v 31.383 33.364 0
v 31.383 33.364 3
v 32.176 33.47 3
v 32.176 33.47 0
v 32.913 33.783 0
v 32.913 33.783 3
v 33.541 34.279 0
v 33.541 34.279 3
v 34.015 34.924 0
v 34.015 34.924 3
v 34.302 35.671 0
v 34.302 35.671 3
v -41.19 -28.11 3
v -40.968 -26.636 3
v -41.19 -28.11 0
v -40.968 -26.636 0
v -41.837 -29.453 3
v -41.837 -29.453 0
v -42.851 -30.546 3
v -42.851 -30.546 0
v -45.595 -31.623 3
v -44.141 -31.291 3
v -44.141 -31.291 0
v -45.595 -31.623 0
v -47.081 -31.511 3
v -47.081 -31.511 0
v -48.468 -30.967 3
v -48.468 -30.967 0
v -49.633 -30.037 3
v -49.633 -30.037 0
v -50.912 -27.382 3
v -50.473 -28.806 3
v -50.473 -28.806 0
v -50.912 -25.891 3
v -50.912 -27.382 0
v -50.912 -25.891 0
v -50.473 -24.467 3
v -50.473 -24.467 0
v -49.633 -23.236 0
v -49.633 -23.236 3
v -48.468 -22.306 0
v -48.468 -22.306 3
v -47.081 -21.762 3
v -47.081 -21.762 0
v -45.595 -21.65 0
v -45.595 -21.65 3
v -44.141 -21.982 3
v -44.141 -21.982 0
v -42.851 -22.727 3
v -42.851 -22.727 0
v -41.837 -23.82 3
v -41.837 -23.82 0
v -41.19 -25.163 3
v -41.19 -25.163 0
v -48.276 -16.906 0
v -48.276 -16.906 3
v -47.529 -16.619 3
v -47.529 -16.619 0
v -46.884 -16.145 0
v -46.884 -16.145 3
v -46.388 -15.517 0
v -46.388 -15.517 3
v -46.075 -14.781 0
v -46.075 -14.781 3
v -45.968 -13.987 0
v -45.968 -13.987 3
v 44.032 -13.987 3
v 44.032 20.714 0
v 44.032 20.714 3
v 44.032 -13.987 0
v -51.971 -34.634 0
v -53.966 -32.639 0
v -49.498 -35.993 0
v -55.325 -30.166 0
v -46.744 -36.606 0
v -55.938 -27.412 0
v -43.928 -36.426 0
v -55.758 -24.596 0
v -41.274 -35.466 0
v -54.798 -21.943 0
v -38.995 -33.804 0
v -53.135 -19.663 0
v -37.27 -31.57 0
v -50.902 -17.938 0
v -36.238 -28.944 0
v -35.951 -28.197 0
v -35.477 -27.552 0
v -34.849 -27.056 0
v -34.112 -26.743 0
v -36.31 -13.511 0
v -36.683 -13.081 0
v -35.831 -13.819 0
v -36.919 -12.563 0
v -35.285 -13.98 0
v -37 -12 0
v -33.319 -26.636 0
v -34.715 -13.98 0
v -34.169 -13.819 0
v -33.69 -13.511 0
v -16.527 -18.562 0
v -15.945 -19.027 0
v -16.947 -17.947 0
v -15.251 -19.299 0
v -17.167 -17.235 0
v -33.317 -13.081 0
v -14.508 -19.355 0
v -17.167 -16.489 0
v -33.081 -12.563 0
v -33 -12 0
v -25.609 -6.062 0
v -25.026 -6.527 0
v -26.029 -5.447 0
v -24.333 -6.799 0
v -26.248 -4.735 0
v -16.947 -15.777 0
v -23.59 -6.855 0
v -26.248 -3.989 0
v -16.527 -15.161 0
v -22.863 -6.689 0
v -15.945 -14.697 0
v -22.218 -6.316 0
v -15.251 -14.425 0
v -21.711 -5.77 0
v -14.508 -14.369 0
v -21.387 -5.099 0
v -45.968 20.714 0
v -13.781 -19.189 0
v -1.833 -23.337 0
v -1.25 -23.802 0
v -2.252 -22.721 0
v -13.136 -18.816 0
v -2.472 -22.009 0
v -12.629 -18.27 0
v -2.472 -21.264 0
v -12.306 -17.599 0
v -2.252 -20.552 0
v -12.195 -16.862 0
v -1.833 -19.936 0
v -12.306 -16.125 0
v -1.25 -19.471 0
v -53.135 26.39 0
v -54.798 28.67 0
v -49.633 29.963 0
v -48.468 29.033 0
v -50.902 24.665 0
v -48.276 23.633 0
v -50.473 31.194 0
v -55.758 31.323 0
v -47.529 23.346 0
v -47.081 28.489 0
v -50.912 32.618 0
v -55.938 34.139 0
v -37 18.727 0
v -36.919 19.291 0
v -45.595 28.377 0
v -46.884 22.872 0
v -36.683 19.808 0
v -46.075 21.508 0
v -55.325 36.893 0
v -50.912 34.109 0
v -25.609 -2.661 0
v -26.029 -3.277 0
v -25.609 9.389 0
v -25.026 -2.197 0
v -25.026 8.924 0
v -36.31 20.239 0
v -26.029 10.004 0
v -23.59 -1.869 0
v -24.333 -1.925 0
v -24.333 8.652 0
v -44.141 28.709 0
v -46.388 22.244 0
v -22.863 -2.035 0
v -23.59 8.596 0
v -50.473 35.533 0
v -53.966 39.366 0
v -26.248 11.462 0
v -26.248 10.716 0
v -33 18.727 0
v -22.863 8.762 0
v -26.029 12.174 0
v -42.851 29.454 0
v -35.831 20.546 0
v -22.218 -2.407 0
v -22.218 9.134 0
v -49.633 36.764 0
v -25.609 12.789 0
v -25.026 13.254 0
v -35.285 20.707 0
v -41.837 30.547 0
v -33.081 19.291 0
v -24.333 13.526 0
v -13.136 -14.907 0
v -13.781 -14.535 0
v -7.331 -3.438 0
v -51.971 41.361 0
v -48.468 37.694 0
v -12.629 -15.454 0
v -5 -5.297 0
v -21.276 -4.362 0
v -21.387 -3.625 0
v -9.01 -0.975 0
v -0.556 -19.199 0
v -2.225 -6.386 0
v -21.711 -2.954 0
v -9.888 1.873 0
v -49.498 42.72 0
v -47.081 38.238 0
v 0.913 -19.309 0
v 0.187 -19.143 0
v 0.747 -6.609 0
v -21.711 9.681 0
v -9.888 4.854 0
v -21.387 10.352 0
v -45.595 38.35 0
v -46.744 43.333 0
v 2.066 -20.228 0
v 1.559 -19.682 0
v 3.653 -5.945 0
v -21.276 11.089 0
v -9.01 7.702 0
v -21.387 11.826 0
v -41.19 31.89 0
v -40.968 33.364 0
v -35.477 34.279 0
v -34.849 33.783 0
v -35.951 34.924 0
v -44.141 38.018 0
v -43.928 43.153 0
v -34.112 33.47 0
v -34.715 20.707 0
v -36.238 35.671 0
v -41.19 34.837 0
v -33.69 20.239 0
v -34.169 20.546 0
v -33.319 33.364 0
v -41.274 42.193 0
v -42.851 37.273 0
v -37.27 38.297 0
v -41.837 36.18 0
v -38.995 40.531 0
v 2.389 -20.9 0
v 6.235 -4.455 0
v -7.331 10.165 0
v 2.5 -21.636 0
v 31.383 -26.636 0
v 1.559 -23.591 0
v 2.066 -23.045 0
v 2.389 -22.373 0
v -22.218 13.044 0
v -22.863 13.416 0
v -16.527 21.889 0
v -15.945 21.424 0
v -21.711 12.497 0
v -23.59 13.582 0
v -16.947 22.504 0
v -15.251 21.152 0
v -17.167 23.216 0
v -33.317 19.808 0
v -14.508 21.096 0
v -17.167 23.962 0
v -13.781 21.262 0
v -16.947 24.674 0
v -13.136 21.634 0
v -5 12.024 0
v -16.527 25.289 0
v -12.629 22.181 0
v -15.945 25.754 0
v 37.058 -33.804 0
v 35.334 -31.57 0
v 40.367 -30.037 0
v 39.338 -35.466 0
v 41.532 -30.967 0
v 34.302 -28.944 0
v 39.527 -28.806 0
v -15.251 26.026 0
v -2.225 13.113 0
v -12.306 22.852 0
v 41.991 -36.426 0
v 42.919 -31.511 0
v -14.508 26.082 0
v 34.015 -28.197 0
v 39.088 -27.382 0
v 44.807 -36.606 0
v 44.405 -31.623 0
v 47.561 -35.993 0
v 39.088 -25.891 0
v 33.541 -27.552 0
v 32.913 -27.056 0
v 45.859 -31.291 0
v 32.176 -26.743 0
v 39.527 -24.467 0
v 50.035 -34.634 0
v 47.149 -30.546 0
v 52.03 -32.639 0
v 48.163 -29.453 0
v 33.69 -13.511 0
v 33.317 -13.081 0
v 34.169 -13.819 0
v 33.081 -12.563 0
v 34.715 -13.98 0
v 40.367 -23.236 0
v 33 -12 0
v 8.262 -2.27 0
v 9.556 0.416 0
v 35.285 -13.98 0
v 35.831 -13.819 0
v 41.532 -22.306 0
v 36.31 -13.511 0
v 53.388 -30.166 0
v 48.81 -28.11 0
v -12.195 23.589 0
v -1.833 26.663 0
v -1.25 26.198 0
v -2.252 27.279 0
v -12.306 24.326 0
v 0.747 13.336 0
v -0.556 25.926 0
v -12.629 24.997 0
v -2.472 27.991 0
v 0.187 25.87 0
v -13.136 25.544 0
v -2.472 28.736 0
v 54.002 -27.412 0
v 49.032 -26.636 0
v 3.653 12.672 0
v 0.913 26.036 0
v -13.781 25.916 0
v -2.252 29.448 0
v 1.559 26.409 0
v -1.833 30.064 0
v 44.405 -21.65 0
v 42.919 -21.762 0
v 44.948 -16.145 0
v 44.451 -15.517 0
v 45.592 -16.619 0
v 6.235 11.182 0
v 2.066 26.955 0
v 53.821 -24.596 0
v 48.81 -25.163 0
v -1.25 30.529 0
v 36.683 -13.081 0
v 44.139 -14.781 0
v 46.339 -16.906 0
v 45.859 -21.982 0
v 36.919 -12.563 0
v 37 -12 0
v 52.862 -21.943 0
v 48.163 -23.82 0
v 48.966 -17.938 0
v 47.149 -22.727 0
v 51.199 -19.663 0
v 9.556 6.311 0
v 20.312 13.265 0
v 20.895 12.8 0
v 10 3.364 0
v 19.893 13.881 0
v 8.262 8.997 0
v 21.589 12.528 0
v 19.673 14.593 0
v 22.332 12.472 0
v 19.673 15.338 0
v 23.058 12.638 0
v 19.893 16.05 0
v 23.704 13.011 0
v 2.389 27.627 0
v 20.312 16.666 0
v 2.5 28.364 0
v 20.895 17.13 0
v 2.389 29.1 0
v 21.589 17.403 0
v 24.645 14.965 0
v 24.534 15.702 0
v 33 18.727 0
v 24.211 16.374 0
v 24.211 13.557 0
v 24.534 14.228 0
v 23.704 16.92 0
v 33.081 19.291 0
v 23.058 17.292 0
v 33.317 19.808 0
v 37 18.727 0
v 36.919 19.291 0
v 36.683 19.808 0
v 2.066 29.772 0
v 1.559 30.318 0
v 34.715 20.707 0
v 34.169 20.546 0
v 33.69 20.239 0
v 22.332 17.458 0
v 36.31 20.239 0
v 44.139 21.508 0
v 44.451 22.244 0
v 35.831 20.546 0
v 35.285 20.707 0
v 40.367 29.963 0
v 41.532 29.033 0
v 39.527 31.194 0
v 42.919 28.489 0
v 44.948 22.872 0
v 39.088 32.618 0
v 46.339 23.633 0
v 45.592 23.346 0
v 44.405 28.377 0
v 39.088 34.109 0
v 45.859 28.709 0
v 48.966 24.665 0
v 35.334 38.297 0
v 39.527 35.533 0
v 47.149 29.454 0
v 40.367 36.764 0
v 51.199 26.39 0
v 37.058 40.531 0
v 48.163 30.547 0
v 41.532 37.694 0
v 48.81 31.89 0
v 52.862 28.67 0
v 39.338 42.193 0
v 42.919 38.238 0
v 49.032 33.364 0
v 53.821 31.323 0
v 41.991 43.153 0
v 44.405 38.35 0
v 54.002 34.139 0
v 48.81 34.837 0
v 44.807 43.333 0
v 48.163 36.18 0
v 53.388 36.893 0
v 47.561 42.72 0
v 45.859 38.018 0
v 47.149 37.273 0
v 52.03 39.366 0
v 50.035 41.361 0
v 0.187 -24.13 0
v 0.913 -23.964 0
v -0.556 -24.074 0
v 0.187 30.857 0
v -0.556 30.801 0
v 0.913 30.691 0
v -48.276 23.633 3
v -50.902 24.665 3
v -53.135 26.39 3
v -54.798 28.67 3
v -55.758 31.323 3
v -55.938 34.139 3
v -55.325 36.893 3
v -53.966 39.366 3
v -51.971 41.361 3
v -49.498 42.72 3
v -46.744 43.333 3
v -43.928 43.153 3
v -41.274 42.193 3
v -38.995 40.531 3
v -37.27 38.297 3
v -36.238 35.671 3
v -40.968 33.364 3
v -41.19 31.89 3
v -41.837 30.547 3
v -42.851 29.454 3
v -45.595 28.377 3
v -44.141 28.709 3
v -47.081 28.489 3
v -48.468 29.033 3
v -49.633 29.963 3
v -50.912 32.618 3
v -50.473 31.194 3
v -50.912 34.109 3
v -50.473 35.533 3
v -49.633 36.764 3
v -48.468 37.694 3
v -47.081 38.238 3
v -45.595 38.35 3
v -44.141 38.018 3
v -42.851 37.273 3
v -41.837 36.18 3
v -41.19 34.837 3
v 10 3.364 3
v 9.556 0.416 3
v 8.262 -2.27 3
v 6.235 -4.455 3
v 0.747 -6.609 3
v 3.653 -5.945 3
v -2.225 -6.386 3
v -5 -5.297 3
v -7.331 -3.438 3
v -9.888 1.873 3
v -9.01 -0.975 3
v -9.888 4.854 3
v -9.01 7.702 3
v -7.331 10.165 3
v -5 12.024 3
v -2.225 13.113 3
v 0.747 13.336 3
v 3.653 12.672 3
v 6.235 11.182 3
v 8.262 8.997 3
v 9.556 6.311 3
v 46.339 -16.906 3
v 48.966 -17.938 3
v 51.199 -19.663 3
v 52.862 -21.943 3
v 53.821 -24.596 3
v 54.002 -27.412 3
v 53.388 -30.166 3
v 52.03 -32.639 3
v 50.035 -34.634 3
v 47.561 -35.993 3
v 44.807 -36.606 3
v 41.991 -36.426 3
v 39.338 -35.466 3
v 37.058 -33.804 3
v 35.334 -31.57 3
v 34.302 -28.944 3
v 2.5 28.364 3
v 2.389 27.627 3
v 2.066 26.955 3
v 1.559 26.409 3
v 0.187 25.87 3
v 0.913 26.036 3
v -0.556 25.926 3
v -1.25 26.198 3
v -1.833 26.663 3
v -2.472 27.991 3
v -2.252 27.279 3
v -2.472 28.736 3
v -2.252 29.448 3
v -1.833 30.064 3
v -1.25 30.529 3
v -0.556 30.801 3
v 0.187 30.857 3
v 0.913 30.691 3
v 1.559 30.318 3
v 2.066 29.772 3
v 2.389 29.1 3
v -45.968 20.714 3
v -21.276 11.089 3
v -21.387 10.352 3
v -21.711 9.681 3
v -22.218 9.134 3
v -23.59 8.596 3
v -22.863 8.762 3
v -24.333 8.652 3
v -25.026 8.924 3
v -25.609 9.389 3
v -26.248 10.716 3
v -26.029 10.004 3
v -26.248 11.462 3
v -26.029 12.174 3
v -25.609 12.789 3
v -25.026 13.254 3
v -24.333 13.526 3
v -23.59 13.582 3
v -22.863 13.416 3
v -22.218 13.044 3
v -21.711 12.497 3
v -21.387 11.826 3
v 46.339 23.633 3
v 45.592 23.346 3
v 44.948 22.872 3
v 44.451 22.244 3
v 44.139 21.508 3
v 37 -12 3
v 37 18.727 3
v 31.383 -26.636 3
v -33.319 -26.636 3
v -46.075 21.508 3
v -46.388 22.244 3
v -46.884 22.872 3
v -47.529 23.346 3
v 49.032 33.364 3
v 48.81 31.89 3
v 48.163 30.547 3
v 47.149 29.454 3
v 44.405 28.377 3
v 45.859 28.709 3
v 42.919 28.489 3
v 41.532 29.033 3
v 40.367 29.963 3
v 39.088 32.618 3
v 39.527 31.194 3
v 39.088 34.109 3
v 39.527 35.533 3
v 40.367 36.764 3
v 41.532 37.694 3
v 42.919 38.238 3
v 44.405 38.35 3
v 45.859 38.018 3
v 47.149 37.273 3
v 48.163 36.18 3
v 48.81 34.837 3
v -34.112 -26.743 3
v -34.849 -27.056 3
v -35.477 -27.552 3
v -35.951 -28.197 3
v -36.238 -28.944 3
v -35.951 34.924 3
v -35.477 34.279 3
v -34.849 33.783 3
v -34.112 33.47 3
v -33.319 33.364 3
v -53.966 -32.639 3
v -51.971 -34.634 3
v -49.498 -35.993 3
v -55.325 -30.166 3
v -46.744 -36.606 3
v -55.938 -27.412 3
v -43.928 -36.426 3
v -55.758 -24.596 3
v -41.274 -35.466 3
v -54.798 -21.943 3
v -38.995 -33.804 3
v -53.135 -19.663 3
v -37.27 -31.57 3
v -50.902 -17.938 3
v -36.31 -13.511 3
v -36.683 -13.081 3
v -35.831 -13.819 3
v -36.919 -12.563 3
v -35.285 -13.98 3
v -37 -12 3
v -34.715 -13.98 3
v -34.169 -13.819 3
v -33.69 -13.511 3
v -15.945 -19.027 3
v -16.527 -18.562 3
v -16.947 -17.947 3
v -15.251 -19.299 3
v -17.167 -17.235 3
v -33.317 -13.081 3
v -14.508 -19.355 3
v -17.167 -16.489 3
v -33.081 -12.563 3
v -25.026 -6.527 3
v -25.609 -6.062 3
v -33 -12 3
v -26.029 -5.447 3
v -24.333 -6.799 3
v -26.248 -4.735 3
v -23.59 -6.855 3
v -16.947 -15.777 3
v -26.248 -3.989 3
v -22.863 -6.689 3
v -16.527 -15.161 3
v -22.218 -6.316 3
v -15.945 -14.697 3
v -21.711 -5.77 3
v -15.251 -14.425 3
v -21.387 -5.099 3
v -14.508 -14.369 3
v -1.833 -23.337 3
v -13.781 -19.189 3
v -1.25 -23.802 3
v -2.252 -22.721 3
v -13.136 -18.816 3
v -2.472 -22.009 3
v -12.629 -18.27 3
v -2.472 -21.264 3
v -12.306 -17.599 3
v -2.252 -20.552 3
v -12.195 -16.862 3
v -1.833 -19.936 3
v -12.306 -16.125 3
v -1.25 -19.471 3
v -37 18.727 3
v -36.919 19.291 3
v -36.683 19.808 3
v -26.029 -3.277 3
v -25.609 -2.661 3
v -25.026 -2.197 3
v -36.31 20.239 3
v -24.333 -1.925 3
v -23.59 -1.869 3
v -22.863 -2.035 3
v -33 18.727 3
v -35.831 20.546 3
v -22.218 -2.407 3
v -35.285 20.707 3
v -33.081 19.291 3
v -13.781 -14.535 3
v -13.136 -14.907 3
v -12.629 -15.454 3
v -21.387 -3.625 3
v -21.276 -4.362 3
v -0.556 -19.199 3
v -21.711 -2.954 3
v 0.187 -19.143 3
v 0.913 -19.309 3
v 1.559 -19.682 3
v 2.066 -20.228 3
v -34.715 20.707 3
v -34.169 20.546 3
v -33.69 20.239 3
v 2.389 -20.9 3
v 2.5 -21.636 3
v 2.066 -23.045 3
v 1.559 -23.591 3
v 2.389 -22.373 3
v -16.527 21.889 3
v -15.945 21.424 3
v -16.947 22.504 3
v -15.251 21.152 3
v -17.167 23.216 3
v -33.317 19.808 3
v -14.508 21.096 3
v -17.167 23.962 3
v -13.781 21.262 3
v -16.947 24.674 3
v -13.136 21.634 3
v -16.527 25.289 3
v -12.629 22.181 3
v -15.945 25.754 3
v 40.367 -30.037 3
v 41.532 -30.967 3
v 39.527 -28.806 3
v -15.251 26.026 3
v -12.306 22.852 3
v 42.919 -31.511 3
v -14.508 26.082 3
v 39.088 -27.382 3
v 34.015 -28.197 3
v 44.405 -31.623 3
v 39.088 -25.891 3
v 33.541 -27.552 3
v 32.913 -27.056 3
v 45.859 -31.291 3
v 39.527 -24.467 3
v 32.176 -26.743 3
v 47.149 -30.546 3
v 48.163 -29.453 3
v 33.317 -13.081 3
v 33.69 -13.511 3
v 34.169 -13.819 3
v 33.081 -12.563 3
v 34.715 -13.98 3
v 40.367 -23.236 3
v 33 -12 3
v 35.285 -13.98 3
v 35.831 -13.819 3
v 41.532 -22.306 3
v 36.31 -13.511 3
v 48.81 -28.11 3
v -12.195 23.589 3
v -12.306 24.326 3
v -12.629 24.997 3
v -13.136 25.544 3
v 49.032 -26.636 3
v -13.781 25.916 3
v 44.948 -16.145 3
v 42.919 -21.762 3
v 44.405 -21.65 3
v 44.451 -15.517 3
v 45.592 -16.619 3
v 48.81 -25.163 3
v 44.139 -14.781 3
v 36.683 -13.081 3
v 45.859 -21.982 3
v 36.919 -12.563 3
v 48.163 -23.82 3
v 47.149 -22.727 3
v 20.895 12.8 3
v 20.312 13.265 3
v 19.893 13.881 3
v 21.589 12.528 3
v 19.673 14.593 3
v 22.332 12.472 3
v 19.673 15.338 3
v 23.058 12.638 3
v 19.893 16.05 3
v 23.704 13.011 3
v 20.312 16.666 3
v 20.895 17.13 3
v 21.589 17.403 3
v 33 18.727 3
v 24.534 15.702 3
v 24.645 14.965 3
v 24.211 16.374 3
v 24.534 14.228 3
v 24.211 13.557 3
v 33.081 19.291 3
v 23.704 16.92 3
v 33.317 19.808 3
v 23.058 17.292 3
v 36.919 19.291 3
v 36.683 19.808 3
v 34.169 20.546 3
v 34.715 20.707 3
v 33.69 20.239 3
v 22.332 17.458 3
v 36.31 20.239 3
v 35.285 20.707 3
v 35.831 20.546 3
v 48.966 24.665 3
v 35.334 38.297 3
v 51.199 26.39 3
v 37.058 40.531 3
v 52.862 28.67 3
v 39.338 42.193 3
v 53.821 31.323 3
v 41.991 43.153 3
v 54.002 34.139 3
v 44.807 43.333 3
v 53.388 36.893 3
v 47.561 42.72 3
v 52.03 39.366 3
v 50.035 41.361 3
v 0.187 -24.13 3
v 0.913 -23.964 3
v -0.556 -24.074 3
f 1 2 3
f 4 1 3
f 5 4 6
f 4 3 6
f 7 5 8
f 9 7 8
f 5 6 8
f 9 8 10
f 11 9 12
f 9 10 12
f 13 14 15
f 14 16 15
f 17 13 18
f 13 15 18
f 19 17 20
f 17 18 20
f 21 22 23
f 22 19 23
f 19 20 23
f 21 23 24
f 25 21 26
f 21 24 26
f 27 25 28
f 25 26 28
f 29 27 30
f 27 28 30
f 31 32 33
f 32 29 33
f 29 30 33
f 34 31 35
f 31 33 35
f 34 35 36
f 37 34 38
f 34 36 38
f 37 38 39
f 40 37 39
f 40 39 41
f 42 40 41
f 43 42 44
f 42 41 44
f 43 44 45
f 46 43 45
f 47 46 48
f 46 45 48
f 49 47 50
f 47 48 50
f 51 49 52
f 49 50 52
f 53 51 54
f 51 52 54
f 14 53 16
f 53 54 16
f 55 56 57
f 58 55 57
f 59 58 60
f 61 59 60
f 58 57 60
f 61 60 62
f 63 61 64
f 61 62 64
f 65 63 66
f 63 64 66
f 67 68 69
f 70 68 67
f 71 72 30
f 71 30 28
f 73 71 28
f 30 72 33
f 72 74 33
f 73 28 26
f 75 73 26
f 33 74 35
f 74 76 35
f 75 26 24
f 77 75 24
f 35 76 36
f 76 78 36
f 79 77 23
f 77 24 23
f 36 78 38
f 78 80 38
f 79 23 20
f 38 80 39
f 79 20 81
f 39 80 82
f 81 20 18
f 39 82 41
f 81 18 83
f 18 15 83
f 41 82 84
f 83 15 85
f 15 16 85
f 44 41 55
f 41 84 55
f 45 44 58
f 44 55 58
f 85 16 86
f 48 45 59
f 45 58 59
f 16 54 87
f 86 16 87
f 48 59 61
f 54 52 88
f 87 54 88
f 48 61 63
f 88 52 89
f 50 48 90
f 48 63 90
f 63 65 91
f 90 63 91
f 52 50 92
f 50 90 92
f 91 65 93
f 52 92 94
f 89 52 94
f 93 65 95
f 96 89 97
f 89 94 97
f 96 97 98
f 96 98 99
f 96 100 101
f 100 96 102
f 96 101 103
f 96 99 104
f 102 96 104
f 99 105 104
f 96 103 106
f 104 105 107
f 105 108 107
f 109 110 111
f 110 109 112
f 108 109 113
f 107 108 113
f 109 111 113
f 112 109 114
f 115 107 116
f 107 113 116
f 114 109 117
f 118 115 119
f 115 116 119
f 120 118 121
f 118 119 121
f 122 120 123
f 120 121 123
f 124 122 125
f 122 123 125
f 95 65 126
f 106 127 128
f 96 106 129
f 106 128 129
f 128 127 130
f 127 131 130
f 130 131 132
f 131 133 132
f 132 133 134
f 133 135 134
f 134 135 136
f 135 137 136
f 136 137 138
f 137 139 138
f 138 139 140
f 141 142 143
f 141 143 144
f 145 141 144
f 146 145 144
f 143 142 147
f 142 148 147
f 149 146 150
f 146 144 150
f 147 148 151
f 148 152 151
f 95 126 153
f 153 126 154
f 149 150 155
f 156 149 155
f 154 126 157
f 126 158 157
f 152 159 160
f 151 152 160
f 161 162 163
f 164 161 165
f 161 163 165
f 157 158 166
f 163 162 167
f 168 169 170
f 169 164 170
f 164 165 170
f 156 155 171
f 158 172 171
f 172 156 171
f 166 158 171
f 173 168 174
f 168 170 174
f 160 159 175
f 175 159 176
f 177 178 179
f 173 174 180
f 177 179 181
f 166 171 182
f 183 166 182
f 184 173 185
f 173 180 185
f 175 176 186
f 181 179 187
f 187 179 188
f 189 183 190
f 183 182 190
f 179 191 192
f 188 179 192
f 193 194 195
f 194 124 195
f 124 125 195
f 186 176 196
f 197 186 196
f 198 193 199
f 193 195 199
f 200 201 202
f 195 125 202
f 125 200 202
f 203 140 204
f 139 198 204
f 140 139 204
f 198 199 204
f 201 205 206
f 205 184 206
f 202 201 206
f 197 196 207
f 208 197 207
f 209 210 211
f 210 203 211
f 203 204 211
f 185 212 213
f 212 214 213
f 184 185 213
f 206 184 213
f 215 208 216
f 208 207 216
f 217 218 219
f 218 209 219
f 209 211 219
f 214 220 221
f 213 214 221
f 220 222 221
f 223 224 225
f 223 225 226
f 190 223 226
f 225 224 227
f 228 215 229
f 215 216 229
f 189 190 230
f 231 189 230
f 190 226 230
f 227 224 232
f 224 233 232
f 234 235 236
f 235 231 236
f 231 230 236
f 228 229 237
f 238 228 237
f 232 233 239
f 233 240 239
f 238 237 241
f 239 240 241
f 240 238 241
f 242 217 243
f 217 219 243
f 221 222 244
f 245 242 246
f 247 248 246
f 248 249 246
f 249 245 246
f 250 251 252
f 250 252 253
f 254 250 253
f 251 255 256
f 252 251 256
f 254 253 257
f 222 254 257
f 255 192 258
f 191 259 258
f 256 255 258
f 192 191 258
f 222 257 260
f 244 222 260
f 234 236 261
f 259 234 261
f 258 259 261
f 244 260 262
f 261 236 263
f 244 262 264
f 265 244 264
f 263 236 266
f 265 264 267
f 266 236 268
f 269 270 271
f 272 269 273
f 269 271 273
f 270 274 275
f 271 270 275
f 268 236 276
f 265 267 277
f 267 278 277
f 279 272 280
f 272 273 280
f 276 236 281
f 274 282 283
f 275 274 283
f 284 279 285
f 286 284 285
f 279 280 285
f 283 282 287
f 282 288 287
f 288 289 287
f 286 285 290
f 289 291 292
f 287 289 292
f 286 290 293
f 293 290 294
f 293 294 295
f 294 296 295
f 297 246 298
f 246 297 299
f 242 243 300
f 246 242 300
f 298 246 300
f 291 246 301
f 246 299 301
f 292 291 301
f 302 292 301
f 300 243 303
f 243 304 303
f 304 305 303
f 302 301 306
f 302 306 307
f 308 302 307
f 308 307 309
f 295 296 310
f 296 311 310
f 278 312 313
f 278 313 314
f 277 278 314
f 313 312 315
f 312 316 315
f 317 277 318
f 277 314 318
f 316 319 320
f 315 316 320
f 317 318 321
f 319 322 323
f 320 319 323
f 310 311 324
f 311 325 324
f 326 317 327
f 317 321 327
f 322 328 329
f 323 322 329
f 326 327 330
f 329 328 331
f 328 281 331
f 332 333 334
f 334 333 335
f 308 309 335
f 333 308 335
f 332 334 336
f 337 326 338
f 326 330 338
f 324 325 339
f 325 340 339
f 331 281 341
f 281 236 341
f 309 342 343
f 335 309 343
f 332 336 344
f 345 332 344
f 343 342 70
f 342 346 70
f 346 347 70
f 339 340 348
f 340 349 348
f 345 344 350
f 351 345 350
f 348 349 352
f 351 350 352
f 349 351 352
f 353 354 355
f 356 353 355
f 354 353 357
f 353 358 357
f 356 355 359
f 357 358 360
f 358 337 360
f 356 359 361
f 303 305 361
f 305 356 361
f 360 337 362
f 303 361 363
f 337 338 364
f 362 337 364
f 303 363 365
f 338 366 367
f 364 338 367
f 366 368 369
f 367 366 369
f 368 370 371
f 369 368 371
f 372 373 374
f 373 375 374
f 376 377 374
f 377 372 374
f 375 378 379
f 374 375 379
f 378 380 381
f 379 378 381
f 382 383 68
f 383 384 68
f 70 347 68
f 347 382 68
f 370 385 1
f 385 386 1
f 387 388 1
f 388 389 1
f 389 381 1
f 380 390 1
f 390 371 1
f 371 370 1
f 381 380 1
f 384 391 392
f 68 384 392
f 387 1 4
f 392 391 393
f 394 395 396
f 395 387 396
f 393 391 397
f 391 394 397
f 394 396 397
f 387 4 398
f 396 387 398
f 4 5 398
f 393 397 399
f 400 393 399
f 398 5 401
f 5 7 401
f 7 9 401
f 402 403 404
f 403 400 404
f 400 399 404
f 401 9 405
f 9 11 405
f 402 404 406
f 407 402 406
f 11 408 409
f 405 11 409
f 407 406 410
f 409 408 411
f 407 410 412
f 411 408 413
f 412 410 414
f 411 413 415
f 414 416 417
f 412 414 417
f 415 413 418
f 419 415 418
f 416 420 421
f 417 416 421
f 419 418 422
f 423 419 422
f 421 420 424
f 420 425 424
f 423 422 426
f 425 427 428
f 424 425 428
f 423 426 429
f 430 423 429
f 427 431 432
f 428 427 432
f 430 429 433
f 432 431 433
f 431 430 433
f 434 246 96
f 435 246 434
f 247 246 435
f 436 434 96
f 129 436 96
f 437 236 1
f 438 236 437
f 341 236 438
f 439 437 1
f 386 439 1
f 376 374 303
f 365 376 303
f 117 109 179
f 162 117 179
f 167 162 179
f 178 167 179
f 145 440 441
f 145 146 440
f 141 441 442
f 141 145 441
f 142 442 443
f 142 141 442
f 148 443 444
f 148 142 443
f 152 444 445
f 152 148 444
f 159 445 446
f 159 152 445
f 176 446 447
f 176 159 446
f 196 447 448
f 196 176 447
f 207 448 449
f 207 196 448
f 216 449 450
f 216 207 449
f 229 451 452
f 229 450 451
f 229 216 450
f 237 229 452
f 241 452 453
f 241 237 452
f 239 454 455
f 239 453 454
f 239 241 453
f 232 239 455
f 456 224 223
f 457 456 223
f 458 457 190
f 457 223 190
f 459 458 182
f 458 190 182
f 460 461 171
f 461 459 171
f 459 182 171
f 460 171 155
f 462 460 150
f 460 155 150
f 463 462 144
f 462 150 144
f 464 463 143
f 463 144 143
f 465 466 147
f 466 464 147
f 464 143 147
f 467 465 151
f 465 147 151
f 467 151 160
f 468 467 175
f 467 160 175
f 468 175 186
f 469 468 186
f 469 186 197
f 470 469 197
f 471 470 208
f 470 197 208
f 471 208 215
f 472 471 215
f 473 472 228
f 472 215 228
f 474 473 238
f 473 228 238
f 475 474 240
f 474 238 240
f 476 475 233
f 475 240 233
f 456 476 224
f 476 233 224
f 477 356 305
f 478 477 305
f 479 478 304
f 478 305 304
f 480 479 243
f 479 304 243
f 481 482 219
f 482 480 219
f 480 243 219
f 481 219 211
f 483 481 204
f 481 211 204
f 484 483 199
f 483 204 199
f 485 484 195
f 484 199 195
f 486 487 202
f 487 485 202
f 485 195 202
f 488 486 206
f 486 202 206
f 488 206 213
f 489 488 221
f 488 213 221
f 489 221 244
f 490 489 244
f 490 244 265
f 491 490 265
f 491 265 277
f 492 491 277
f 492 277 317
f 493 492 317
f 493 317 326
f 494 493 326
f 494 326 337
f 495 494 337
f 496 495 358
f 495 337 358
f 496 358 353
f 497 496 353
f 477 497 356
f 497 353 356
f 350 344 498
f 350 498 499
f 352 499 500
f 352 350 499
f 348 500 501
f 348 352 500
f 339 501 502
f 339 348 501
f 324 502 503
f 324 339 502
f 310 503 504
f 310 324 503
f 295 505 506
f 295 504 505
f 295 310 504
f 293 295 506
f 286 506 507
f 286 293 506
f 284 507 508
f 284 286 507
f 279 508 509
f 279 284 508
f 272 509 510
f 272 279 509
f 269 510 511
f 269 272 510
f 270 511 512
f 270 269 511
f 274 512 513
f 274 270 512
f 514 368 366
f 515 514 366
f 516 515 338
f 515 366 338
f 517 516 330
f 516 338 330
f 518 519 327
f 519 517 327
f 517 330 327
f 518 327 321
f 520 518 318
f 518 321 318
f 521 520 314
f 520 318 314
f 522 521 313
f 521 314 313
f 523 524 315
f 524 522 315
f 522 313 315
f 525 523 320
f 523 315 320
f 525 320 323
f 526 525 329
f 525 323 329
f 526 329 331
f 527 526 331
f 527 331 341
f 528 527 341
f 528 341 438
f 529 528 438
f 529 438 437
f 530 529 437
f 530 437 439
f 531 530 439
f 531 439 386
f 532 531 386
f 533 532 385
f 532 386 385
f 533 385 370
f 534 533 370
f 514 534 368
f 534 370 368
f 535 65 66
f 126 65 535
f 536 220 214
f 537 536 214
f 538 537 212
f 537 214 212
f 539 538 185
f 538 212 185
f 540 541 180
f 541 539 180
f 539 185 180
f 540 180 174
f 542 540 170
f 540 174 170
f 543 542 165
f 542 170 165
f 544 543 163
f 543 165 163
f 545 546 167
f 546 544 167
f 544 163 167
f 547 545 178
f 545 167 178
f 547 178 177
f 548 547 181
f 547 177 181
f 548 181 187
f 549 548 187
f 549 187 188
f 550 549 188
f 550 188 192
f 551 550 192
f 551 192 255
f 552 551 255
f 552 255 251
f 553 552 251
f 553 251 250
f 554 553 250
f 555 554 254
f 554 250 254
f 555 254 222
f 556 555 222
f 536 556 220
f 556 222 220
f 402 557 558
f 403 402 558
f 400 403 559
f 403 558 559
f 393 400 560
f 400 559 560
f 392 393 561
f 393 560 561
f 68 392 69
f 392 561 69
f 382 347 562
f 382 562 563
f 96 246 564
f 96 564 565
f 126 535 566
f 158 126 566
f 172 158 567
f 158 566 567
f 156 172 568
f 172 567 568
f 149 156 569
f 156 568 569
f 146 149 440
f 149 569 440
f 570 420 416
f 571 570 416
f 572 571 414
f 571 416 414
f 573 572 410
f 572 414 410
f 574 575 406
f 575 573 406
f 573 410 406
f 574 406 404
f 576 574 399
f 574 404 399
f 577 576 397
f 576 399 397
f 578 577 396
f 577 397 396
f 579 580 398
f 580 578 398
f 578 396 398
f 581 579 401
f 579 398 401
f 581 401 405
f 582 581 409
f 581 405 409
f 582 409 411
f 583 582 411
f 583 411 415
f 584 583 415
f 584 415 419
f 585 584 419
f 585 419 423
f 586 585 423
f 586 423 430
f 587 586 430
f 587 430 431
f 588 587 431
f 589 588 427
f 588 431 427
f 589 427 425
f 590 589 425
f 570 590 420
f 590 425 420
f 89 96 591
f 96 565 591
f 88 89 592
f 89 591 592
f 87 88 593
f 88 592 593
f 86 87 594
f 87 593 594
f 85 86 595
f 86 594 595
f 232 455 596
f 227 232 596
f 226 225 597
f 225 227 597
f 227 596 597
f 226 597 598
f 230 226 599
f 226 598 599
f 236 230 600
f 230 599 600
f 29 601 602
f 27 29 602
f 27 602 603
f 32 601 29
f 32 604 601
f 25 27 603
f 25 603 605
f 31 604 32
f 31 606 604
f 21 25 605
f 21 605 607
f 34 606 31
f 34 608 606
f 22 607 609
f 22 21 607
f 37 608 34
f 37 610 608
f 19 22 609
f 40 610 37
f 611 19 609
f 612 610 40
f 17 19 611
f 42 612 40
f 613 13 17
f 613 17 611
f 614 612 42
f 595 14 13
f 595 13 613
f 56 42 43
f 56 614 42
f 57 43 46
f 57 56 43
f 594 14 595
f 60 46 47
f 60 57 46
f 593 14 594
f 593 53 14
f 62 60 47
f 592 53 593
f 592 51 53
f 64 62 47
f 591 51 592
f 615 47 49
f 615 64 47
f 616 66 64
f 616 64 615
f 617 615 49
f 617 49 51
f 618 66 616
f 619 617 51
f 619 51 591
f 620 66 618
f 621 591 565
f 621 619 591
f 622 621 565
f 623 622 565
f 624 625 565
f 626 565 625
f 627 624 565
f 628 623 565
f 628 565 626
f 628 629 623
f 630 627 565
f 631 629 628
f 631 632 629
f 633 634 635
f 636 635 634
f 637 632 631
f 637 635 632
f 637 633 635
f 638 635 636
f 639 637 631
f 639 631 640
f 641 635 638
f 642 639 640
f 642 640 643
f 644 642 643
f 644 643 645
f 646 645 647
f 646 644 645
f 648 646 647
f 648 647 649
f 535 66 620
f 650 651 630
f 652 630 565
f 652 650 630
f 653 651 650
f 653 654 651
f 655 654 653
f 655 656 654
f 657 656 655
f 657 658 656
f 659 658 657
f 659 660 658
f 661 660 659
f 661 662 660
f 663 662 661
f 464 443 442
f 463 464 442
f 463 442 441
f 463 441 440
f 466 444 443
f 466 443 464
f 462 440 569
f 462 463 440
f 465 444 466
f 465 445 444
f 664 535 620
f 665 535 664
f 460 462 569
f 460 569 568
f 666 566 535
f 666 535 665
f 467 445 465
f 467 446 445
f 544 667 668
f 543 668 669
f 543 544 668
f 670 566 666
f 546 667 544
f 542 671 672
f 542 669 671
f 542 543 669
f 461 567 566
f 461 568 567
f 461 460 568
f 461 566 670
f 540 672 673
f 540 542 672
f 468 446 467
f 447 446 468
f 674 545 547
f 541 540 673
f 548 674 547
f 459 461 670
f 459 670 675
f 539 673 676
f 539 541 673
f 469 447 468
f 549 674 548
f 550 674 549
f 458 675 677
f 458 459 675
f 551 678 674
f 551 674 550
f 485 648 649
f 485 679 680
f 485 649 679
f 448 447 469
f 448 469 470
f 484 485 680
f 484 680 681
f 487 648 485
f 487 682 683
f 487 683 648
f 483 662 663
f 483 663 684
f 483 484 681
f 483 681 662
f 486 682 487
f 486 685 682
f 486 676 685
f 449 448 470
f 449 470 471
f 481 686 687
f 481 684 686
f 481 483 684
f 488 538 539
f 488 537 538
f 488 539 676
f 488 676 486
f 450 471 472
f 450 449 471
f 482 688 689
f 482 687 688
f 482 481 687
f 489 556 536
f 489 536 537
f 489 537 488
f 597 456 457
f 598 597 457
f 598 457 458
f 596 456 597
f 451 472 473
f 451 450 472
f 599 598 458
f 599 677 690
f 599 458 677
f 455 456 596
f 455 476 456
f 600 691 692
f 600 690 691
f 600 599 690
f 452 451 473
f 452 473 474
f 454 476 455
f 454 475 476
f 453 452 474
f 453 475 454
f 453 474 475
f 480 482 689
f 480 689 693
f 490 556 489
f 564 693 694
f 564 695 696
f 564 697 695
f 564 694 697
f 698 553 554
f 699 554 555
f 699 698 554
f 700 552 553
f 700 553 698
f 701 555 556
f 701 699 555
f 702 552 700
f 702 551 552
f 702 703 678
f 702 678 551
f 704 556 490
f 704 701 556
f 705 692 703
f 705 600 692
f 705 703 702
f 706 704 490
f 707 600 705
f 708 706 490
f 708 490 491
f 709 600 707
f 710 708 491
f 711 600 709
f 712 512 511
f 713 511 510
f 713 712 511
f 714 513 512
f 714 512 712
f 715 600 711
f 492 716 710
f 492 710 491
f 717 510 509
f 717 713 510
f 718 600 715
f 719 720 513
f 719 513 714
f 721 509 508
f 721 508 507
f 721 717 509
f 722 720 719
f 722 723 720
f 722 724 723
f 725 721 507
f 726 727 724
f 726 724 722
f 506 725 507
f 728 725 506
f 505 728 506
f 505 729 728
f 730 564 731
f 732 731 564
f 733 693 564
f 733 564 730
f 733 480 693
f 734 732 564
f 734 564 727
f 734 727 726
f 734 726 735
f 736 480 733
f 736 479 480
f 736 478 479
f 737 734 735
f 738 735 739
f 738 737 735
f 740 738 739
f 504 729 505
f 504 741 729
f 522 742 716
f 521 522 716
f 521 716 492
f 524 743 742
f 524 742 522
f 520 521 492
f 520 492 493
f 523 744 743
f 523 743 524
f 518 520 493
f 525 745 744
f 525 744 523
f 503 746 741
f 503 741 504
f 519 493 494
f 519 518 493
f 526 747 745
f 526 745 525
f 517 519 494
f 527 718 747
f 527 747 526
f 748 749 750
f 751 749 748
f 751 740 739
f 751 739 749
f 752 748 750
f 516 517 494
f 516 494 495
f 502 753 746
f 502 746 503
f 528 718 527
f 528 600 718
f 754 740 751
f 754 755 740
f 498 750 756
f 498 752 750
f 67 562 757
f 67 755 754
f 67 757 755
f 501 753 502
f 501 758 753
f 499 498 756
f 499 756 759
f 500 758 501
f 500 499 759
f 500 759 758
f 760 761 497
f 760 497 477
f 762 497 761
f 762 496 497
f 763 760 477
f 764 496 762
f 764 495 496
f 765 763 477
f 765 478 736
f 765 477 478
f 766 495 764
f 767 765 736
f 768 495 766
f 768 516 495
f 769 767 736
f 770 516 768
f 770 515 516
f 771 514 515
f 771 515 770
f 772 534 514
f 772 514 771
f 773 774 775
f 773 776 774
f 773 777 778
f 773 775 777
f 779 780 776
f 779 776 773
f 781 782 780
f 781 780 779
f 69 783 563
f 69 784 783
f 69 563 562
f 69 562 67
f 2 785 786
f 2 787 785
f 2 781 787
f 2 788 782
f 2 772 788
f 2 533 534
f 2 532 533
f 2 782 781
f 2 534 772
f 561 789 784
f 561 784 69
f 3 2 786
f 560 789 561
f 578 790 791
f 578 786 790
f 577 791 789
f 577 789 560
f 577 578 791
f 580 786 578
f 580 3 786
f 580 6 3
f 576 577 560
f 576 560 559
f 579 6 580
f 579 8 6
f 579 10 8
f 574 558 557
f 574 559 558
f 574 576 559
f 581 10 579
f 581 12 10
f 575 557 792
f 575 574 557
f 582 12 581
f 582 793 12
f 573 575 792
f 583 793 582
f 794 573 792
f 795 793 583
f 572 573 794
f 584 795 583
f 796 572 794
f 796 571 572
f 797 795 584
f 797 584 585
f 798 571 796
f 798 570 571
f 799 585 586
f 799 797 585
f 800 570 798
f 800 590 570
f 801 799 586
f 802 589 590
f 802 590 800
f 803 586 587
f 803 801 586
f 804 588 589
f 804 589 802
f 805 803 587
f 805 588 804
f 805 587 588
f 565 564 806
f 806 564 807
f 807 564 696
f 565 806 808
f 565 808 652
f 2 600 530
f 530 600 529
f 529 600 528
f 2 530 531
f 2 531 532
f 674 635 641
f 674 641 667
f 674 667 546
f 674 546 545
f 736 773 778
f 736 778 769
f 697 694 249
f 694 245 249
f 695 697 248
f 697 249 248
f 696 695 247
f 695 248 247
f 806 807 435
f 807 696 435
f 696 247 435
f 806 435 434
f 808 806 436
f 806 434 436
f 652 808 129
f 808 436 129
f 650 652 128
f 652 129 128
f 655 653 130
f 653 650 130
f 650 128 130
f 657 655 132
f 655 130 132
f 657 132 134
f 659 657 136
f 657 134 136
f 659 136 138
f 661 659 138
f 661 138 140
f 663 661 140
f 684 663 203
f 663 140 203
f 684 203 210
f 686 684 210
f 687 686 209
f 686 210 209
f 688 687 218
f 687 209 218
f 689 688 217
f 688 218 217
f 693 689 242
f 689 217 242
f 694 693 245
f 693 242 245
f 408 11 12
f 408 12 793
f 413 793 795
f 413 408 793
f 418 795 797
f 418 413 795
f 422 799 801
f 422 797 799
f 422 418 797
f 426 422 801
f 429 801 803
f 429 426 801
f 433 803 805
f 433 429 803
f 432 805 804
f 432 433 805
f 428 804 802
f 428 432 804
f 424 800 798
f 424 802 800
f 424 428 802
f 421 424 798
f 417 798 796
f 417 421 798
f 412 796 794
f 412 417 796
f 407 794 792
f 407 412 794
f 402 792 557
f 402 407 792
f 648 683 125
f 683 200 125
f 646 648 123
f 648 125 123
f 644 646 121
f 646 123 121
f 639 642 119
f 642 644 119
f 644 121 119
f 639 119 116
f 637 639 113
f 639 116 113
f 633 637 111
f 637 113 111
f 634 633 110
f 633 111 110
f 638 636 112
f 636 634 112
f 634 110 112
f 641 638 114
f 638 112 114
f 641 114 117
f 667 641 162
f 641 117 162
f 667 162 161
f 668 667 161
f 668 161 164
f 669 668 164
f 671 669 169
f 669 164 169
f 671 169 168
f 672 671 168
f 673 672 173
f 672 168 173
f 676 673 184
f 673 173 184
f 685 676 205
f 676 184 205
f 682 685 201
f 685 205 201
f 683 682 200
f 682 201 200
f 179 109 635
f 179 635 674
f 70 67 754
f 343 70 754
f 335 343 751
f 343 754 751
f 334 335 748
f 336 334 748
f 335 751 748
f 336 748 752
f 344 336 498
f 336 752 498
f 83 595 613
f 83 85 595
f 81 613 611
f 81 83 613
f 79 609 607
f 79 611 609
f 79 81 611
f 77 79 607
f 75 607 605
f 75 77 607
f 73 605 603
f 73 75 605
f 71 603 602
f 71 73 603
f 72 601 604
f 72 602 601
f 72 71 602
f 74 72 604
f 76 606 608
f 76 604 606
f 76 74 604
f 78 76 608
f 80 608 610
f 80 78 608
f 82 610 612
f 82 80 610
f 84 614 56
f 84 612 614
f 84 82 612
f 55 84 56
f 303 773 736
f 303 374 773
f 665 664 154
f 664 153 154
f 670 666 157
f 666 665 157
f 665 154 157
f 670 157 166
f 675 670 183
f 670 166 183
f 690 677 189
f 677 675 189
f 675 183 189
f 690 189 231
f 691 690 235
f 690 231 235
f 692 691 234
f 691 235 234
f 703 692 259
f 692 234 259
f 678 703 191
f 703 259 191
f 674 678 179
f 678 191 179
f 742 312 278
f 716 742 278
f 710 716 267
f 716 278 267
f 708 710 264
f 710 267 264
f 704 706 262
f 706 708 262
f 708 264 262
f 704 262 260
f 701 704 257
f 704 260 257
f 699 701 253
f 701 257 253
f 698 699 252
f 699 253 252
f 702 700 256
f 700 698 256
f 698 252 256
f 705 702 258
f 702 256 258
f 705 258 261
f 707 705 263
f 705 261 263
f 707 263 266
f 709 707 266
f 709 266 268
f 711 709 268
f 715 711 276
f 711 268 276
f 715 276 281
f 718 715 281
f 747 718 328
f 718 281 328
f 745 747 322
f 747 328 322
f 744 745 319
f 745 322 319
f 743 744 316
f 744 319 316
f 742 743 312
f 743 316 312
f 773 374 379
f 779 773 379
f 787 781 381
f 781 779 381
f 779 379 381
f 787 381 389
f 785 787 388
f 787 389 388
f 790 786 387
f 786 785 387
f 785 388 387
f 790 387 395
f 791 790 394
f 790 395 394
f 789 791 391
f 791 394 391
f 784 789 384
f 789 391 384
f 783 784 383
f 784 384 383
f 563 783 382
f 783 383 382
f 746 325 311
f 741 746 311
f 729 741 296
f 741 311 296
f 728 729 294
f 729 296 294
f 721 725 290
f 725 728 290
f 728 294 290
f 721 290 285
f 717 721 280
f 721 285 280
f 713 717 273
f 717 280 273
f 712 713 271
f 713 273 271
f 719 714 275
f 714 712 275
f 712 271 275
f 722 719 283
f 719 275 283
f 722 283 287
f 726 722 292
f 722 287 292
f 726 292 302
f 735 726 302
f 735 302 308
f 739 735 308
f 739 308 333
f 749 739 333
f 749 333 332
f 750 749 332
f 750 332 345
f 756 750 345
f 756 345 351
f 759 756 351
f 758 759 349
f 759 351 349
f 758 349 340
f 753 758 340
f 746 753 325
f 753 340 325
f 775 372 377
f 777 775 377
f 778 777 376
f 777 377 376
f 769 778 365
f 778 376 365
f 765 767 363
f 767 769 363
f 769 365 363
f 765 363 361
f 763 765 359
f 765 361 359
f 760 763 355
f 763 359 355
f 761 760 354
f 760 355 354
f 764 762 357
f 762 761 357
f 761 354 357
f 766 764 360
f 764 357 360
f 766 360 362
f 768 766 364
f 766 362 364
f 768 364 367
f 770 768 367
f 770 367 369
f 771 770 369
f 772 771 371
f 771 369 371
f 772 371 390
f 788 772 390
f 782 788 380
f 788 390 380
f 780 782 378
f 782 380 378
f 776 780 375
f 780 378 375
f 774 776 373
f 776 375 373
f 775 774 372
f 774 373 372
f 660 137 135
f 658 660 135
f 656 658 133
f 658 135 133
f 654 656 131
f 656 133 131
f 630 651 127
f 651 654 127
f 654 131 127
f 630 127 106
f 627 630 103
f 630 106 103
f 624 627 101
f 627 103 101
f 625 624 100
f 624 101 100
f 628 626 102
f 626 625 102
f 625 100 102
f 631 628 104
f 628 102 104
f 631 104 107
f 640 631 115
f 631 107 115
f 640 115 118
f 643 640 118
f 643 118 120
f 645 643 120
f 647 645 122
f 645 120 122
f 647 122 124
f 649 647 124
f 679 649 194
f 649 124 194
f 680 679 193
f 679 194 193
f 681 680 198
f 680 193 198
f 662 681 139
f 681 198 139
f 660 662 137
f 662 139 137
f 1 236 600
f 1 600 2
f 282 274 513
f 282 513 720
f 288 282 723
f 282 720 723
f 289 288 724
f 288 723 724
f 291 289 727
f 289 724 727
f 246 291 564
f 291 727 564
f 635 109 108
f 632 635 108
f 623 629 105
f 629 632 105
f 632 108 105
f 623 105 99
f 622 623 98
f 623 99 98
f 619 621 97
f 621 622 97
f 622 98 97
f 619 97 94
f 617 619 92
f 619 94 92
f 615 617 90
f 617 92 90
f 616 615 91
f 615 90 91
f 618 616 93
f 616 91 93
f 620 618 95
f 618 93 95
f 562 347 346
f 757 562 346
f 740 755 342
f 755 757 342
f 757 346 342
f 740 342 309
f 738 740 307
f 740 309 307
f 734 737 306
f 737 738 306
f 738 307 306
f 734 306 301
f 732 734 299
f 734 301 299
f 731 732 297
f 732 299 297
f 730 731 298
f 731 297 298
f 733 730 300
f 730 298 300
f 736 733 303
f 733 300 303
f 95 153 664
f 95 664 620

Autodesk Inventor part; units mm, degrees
ref_plane "YZ Plane" through (0, 0, 0) normal (1, 0, 0) x (0, 1, 0)
ref_plane "XZ Plane" through (0, 0, 0) normal (0, 1, 0) x (-1, 0, 0)
ref_plane "XY Plane" through (0, 0, 0) normal (0, 0, 1) x (1, 0, 0)
sketch "Sketch1" plane through (0, 0, 0) normal (0, 0, 1) x (1, 0, 0)
  line L0 (-35.9682, 33.3635) -> (34.0318, 33.3635)
  line L1 (-45.9682, -16.6365) -> (-45.9682, 23.3635)
  circle A0 centre (-45.9682, 33.3635) radius 5
  circle A1 centre (44.0318, 33.3635) radius 5
  circle A2 centre (44.0318, -26.6365) radius 5
  circle A3 centre (-45.9682, -26.6365) radius 5
  arc A4 (-35.9682, 33.3635) -> (-45.9682, 23.3635) centre (-45.9682, 33.3635) ccw
  arc A5 (44.0318, 23.3635) -> (34.0318, 33.3635) centre (44.0318, 33.3635) ccw
  arc A6 (34.0318, -26.6365) -> (44.0318, -16.6365) centre (44.0318, -26.6365) ccw
  arc A7 (-45.9682, -16.6365) -> (-35.9682, -26.6365) centre (-45.9682, -26.6365) ccw
  line L2 (34.0318, -26.6365) -> (-35.9682, -26.6365)
  line L3 (44.0318, 23.3635) -> (44.0318, -16.6365)
  arc A8 (-33, 18.7271) -> (-37, 18.7271) centre (-35, 18.7271) ccw
  arc A9 (-37, -12) -> (-33, -12) centre (-35, -12) ccw
  arc A10 (37, 18.7271) -> (33, 18.7271) centre (35, 18.7271) ccw
  arc A11 (33, -12) -> (37, -12) centre (35, -12) ccw
  line L4 (-37, 18.7271) -> (-37, -12)
  line L5 (-33, -12) -> (-33, 18.7271)
  line L6 (33, 18.7271) -> (33, -12)
  line L7 (37, -12) -> (37, 18.7271)
  circle A12 centre (0, 3.3635) radius 10
  circle A13 centre (22.145, 14.9653) radius 2.5
  circle A14 centre (-14.6946, 23.589) radius 2.5
  circle A15 centre (-23.7764, 11.089) radius 2.5
  circle A16 centre (-23.7764, -4.3619) radius 2.5
  circle A17 centre (-14.6946, -16.8619) radius 2.5
  circle A18 centre (0, -21.6365) radius 2.5
  circle A19 centre (0, 28.3635) radius 2.5
  dimension "d22" = 242.35
extrude "Extrusion1" add sketch "Sketch1" along normal blind 3
fillet "Fillet1" radius 3 8 edges at (-35.9682, 33.3635, 1.5) (44.0318, -16.6365, 1.5) (-45.9682, -16.6365, 1.5) (34.0318, 33.3635, 1.5) (34.0318, -26.6365, 1.5) (-45.9682, 23.3635, 1.5) (-35.9682, -26.6365, 1.5) (44.0318, 23.3635, 1.5)
properties part number "Desafio 3 - MASA - Inventor"
